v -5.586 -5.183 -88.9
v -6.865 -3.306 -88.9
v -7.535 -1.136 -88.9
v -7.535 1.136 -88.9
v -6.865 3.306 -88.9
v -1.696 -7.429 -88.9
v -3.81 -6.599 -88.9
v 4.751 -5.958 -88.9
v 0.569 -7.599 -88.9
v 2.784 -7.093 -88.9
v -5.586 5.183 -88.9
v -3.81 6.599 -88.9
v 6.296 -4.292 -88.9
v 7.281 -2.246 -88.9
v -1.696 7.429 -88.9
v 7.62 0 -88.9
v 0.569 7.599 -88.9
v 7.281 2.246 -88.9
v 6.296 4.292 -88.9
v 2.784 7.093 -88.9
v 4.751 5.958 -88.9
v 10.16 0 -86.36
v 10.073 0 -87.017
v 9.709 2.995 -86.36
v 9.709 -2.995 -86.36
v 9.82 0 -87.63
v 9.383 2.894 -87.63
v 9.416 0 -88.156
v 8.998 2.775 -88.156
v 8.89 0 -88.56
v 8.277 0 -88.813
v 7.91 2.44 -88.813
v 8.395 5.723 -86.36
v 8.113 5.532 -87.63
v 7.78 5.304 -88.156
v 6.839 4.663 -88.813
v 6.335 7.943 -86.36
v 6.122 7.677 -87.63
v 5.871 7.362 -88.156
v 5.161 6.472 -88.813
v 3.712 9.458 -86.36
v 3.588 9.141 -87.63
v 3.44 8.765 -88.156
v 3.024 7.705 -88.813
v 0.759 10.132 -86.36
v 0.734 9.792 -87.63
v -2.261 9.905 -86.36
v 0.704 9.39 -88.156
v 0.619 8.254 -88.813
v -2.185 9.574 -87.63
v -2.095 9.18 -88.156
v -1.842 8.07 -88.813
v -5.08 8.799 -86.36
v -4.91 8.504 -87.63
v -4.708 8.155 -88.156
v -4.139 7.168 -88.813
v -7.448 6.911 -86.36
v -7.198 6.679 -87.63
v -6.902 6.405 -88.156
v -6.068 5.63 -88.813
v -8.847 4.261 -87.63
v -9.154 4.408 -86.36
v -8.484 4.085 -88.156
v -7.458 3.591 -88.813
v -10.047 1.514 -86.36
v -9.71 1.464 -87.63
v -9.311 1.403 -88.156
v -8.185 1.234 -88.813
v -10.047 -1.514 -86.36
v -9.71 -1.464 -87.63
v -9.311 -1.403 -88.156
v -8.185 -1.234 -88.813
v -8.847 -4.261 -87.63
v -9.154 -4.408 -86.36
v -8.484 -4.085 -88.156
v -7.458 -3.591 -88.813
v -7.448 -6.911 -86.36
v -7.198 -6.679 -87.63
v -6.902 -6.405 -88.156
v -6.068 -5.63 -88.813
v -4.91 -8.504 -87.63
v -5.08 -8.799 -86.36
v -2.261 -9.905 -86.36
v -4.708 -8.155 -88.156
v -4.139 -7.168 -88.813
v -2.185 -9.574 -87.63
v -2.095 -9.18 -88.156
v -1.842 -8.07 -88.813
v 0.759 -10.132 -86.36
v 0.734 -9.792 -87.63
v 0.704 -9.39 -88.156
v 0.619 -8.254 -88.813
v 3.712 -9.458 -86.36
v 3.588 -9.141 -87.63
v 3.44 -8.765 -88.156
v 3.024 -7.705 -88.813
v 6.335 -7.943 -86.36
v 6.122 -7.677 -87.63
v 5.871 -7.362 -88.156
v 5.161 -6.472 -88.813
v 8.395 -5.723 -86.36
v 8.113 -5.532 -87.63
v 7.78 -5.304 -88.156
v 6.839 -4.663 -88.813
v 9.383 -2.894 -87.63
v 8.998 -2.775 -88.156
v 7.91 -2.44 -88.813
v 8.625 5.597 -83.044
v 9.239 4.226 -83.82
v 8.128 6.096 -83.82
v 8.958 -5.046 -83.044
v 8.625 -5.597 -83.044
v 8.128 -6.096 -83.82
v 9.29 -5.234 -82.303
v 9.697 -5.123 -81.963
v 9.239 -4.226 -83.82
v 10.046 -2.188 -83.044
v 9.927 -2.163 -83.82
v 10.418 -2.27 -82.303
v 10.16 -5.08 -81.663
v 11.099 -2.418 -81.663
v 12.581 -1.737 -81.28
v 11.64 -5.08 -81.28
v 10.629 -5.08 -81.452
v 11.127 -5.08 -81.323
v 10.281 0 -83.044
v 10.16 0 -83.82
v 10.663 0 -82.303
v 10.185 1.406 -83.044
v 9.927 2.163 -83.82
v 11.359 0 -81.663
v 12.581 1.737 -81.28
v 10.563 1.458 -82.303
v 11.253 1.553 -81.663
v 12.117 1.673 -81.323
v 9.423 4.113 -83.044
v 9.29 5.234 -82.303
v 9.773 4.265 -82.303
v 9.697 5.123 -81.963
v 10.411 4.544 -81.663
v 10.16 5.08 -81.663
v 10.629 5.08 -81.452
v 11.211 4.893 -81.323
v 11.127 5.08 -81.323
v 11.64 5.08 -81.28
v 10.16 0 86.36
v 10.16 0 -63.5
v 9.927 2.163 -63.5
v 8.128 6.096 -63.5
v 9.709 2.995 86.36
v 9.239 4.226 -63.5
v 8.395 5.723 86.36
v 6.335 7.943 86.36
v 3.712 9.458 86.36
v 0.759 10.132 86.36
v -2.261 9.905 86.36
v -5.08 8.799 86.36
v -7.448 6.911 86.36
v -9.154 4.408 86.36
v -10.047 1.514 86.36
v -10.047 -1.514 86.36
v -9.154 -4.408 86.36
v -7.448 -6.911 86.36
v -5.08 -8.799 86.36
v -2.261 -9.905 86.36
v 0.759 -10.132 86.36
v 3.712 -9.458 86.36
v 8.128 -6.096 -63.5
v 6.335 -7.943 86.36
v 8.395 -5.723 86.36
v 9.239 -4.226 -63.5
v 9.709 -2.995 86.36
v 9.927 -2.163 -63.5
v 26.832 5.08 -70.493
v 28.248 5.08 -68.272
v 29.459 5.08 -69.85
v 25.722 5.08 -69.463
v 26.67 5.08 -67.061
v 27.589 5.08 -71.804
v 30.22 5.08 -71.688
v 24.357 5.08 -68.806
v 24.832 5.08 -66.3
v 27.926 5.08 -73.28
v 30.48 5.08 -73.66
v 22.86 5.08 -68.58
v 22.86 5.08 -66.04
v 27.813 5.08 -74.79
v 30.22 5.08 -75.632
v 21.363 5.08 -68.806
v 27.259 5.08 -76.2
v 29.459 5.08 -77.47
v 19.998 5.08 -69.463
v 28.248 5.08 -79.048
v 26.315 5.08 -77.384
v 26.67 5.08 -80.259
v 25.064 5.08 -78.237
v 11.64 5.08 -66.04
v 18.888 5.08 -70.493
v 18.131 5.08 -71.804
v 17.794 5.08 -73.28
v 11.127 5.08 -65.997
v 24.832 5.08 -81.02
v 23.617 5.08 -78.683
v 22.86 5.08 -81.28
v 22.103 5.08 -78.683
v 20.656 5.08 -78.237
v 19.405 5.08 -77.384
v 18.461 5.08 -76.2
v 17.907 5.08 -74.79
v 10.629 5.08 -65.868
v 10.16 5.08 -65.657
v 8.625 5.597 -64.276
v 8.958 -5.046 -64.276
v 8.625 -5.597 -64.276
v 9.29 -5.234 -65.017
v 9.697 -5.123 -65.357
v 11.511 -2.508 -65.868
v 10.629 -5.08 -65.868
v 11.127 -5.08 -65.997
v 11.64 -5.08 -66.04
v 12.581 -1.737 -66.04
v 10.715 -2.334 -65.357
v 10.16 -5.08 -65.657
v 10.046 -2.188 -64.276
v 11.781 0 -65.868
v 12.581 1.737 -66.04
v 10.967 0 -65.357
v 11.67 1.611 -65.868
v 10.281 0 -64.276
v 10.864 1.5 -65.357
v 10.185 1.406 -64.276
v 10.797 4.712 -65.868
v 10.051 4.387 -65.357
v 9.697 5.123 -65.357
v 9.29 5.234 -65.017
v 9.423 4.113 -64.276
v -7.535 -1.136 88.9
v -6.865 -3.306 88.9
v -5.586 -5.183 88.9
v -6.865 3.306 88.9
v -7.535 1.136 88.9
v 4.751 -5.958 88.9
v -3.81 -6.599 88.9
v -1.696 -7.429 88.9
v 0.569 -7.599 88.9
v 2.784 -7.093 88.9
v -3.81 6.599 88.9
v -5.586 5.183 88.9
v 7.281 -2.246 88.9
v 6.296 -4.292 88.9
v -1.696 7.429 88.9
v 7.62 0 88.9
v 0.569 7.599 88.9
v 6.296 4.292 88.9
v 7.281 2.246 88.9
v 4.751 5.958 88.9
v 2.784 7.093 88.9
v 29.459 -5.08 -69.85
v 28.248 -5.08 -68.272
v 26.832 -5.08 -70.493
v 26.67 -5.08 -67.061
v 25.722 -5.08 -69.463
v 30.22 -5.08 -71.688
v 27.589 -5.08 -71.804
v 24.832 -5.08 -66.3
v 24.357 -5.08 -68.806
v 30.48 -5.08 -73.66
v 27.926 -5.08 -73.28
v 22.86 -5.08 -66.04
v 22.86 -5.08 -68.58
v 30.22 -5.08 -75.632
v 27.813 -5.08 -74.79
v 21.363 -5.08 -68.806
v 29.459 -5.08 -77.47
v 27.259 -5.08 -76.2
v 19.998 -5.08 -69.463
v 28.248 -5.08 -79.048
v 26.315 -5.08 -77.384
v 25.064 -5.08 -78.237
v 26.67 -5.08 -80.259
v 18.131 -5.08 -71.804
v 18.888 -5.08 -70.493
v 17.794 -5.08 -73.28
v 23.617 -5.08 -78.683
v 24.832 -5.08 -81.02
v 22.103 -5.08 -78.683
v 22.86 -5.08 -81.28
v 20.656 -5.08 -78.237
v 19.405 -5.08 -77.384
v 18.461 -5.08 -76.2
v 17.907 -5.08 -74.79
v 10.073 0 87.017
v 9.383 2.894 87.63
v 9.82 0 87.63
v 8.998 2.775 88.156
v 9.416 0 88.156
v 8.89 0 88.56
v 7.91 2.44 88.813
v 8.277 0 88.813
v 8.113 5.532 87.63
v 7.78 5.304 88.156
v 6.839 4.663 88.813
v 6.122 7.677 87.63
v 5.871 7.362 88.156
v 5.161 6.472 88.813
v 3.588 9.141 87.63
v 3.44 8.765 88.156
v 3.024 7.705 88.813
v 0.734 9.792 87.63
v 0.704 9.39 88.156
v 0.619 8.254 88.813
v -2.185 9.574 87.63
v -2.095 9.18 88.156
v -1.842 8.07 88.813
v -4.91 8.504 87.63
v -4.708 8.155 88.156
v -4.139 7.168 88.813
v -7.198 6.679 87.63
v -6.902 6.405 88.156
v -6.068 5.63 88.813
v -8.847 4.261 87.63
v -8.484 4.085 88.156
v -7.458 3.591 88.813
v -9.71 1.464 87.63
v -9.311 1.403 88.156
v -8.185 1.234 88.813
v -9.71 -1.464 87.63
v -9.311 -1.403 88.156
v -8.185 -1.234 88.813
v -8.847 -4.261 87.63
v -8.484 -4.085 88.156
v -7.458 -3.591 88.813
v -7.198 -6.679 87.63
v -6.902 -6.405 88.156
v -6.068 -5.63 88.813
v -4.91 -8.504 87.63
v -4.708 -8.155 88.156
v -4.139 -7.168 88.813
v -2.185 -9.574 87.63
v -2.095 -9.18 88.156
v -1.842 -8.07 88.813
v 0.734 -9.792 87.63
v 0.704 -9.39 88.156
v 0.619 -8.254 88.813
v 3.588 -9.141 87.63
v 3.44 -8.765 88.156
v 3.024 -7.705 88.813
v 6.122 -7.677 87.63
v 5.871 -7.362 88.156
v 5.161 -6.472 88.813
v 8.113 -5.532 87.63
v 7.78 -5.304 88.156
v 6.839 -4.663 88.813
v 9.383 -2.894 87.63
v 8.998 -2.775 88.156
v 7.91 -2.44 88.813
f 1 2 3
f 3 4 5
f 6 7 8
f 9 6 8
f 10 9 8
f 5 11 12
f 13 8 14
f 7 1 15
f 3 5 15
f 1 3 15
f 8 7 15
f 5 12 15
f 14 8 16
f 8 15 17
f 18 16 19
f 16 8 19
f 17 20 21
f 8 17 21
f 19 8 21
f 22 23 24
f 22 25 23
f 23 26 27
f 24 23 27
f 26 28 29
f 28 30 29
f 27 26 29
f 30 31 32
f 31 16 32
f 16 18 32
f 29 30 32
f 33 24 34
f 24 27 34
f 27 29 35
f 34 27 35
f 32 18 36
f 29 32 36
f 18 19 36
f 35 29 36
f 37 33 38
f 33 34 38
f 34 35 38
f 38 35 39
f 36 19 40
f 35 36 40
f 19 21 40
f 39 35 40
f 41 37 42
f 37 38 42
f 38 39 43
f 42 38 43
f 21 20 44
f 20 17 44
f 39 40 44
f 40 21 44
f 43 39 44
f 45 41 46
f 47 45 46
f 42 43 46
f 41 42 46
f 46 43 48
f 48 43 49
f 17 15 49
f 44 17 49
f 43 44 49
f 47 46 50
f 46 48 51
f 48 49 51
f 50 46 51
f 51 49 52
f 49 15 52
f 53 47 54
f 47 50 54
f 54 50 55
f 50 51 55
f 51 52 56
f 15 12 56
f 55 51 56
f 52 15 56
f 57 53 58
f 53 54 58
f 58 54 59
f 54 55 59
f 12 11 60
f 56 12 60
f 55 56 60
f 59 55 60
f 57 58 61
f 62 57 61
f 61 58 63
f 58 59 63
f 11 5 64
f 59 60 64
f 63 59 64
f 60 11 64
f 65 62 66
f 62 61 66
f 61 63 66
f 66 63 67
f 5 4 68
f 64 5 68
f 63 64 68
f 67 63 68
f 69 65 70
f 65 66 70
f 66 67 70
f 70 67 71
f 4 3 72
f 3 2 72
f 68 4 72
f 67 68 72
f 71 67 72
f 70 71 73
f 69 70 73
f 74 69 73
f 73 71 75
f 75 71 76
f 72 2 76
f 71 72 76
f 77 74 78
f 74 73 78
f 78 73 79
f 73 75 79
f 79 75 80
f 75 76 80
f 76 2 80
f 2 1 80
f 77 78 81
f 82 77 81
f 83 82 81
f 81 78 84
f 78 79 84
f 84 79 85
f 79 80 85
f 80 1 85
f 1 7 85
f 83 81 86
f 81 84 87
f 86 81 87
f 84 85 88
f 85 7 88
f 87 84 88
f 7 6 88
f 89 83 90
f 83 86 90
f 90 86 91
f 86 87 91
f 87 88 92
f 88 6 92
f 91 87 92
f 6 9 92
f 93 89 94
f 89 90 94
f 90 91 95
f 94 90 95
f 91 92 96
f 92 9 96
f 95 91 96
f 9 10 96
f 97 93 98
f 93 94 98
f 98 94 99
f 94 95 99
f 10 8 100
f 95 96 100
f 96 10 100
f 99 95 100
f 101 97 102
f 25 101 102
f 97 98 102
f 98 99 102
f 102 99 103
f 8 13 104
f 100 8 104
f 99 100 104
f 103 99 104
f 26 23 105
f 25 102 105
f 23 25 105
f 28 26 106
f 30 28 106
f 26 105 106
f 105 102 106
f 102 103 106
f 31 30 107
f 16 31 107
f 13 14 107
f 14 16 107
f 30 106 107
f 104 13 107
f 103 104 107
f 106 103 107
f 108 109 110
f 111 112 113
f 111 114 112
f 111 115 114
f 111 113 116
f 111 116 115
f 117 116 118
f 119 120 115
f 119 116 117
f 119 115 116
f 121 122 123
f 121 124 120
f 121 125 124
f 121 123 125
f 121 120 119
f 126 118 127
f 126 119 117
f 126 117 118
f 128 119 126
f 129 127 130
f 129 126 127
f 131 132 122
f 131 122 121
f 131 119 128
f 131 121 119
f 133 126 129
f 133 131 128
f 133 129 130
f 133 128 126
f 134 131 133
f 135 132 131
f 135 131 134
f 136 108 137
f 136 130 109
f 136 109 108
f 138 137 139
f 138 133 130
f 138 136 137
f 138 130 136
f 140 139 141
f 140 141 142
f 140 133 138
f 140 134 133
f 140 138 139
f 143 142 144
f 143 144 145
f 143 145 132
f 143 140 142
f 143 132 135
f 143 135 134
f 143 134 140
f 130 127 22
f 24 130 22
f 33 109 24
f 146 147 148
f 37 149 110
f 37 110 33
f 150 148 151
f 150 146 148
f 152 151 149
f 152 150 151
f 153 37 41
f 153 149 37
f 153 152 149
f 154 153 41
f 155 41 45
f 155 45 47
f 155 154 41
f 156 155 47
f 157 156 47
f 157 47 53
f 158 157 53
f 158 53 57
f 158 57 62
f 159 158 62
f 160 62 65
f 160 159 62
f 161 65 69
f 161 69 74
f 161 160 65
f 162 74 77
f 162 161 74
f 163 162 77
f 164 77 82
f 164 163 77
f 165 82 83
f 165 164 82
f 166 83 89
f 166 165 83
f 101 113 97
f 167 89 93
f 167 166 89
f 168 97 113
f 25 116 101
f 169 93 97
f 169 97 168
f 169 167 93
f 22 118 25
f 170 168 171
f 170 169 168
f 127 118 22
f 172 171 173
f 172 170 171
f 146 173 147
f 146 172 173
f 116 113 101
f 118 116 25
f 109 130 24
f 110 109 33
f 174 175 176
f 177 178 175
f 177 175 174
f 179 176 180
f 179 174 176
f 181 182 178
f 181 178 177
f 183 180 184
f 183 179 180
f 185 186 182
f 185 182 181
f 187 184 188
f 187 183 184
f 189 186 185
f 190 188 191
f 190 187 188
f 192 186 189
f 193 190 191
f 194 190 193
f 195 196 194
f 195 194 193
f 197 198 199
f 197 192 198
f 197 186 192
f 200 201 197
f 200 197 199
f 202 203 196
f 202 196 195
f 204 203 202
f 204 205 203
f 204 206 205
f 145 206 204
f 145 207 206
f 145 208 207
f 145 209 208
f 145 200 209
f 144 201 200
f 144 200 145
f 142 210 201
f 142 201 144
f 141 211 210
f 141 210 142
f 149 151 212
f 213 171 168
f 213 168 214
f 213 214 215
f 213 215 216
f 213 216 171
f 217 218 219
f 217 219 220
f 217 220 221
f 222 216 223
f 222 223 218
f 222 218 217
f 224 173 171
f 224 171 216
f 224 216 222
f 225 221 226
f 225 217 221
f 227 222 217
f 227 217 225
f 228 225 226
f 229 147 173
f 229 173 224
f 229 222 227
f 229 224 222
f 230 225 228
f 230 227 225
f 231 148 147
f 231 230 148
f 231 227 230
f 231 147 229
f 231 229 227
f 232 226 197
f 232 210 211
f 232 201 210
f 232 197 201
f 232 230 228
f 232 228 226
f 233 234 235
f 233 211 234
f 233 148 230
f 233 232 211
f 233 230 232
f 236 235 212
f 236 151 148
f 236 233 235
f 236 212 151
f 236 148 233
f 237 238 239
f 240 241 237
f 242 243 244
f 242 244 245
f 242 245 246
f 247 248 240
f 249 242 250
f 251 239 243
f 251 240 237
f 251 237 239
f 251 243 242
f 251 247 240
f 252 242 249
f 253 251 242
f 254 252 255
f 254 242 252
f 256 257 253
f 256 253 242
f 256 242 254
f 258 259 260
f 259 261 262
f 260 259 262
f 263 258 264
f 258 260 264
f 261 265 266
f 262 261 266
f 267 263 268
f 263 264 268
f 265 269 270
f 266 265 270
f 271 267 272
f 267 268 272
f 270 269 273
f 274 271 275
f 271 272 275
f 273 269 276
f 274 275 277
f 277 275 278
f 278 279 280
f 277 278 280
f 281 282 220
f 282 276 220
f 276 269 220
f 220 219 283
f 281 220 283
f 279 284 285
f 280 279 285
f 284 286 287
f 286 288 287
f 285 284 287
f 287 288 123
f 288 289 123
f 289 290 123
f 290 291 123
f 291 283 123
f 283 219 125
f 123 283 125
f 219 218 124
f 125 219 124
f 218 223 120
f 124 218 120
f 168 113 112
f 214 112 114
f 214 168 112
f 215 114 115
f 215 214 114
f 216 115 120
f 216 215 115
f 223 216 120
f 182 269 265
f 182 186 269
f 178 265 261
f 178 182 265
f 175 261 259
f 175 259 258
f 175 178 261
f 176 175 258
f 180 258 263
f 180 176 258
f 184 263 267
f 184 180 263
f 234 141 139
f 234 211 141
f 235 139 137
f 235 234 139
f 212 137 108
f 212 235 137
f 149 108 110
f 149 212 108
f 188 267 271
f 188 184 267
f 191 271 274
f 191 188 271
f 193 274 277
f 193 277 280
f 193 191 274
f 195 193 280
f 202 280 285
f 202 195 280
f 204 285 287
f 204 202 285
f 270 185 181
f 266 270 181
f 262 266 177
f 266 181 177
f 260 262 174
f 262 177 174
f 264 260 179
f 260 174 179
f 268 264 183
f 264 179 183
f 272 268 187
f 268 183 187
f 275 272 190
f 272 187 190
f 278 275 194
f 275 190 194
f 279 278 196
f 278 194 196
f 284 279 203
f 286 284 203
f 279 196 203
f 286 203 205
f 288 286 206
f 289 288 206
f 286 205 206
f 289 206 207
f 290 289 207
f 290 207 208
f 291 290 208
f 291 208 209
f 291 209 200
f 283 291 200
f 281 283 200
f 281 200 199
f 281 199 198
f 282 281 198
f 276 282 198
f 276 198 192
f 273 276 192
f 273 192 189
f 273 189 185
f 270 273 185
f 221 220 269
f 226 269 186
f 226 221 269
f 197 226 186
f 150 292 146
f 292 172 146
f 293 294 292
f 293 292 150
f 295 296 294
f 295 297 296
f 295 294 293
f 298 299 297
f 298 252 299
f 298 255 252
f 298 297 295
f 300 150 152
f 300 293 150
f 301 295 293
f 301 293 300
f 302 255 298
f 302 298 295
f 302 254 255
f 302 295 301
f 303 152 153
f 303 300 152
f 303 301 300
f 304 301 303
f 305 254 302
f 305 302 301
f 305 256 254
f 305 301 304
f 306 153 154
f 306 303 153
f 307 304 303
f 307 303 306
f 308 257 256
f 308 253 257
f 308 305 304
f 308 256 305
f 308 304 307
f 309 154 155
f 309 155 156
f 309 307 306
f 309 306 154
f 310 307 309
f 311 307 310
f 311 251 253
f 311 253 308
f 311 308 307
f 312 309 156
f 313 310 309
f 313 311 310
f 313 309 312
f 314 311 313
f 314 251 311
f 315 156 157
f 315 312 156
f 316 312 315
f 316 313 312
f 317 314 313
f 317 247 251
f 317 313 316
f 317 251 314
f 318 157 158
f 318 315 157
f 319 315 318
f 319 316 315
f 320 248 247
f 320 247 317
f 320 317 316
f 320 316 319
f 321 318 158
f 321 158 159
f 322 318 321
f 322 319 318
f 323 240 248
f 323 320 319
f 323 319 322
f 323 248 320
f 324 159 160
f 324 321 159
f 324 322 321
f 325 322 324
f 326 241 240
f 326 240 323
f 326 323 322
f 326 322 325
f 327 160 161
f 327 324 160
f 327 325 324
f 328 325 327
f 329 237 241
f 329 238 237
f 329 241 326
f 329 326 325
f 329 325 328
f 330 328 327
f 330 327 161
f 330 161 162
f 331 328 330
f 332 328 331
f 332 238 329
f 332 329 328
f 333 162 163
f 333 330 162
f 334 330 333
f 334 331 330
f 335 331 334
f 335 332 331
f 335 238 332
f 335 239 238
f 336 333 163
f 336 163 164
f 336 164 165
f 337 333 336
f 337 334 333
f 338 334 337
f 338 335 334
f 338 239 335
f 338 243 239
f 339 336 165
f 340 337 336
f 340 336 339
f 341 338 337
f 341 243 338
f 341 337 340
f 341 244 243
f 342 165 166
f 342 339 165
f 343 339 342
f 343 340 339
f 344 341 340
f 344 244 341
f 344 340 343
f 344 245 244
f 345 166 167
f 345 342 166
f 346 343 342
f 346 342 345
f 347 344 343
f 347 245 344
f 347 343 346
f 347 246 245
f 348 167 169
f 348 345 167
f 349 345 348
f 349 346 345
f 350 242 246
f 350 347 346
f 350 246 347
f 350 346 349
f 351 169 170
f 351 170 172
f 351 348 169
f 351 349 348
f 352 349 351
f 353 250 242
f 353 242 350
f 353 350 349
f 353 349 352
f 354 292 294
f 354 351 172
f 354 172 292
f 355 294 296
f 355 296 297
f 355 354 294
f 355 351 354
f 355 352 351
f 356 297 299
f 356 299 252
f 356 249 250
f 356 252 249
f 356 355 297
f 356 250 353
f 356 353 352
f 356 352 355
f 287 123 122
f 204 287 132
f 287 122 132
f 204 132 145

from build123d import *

# Parameters (mm, degrees)
SKETCH1_R           = 10.16
BOSS_EXTRUDE1_DEPTH = 88.9
FILLET1_R           = 2.54
SKETCH3_W           = 15.24
SKETCH3_H           = 10.16
BOSS_EXTRUDE2_DEPTH = 30.48
FILLET2_R           = 7.62
CUT_EXTRUDE1_REACH  = 97.208
SKETCH4_R           = 5.08
FILLET3_R           = 2.54


with BuildPart() as part:
    # Sketch1 → Boss-Extrude1 (new, symmetric)
    with BuildSketch(Plane.XY):
        Circle(SKETCH1_R)
    extrude(amount=BOSS_EXTRUDE1_DEPTH, both=True)

    # Fillet1
    fillet1_edges = [part.edges().sort_by_distance(p)[0] for p in [
        (-10.16, 0, -88.9),
        (-10.16, 0, 88.9),
    ]]
    fillet(fillet1_edges, radius=FILLET1_R)

    # Sketch3 → Boss-Extrude2 (add)
    with BuildSketch(Plane(origin=(0, 0, 0), x_dir=(0, 0, -1), z_dir=(1, 0, 0))):
        with Locations((73.66, 0)):
            Rectangle(SKETCH3_W, SKETCH3_H)
    extrude(amount=BOSS_EXTRUDE2_DEPTH)

    # Fillet2
    fillet2_edges = [part.edges().sort_by_distance(p)[0] for p in [
        (30.48, 0, -81.28),
        (30.48, 0, -66.04),
    ]]
    fillet(fillet2_edges, radius=FILLET2_R - 0.0001)  # a hair under: the kernel refuses the full size

    # Sketch4 → Cut-Extrude1 (cut, up to next)
    with BuildSketch(Plane(origin=(0, 5.08, 0), x_dir=(1, 0, 0), z_dir=(0, 1, 0)), mode=Mode.PRIVATE) as cut_extrude1_sk1:
        with Locations(Location((22.86, 73.66, 0), (0, 0, 270))):
            Circle(SKETCH4_R)
    cut_extrude1_tool1 = extrude(cut_extrude1_sk1.sketch, amount=-CUT_EXTRUDE1_REACH, mode=Mode.PRIVATE) & part.part
    add(cut_extrude1_tool1.solids().sort_by_distance((22.86, 5.08, -73.66))[0], mode=Mode.SUBTRACT)

    # Fillet3
    fillet3_edges = [part.edges().sort_by_distance(p)[0] for p in [
        (8.798818102, -5.08, -73.66),
        (9.813806395, 2.629601498, -66.04),
        (8.798818102, 5.08, -73.66),
        (9.813806395, -2.629601498, -81.28),
    ]]
    fillet(fillet3_edges, radius=FILLET3_R)


solid = part.part
